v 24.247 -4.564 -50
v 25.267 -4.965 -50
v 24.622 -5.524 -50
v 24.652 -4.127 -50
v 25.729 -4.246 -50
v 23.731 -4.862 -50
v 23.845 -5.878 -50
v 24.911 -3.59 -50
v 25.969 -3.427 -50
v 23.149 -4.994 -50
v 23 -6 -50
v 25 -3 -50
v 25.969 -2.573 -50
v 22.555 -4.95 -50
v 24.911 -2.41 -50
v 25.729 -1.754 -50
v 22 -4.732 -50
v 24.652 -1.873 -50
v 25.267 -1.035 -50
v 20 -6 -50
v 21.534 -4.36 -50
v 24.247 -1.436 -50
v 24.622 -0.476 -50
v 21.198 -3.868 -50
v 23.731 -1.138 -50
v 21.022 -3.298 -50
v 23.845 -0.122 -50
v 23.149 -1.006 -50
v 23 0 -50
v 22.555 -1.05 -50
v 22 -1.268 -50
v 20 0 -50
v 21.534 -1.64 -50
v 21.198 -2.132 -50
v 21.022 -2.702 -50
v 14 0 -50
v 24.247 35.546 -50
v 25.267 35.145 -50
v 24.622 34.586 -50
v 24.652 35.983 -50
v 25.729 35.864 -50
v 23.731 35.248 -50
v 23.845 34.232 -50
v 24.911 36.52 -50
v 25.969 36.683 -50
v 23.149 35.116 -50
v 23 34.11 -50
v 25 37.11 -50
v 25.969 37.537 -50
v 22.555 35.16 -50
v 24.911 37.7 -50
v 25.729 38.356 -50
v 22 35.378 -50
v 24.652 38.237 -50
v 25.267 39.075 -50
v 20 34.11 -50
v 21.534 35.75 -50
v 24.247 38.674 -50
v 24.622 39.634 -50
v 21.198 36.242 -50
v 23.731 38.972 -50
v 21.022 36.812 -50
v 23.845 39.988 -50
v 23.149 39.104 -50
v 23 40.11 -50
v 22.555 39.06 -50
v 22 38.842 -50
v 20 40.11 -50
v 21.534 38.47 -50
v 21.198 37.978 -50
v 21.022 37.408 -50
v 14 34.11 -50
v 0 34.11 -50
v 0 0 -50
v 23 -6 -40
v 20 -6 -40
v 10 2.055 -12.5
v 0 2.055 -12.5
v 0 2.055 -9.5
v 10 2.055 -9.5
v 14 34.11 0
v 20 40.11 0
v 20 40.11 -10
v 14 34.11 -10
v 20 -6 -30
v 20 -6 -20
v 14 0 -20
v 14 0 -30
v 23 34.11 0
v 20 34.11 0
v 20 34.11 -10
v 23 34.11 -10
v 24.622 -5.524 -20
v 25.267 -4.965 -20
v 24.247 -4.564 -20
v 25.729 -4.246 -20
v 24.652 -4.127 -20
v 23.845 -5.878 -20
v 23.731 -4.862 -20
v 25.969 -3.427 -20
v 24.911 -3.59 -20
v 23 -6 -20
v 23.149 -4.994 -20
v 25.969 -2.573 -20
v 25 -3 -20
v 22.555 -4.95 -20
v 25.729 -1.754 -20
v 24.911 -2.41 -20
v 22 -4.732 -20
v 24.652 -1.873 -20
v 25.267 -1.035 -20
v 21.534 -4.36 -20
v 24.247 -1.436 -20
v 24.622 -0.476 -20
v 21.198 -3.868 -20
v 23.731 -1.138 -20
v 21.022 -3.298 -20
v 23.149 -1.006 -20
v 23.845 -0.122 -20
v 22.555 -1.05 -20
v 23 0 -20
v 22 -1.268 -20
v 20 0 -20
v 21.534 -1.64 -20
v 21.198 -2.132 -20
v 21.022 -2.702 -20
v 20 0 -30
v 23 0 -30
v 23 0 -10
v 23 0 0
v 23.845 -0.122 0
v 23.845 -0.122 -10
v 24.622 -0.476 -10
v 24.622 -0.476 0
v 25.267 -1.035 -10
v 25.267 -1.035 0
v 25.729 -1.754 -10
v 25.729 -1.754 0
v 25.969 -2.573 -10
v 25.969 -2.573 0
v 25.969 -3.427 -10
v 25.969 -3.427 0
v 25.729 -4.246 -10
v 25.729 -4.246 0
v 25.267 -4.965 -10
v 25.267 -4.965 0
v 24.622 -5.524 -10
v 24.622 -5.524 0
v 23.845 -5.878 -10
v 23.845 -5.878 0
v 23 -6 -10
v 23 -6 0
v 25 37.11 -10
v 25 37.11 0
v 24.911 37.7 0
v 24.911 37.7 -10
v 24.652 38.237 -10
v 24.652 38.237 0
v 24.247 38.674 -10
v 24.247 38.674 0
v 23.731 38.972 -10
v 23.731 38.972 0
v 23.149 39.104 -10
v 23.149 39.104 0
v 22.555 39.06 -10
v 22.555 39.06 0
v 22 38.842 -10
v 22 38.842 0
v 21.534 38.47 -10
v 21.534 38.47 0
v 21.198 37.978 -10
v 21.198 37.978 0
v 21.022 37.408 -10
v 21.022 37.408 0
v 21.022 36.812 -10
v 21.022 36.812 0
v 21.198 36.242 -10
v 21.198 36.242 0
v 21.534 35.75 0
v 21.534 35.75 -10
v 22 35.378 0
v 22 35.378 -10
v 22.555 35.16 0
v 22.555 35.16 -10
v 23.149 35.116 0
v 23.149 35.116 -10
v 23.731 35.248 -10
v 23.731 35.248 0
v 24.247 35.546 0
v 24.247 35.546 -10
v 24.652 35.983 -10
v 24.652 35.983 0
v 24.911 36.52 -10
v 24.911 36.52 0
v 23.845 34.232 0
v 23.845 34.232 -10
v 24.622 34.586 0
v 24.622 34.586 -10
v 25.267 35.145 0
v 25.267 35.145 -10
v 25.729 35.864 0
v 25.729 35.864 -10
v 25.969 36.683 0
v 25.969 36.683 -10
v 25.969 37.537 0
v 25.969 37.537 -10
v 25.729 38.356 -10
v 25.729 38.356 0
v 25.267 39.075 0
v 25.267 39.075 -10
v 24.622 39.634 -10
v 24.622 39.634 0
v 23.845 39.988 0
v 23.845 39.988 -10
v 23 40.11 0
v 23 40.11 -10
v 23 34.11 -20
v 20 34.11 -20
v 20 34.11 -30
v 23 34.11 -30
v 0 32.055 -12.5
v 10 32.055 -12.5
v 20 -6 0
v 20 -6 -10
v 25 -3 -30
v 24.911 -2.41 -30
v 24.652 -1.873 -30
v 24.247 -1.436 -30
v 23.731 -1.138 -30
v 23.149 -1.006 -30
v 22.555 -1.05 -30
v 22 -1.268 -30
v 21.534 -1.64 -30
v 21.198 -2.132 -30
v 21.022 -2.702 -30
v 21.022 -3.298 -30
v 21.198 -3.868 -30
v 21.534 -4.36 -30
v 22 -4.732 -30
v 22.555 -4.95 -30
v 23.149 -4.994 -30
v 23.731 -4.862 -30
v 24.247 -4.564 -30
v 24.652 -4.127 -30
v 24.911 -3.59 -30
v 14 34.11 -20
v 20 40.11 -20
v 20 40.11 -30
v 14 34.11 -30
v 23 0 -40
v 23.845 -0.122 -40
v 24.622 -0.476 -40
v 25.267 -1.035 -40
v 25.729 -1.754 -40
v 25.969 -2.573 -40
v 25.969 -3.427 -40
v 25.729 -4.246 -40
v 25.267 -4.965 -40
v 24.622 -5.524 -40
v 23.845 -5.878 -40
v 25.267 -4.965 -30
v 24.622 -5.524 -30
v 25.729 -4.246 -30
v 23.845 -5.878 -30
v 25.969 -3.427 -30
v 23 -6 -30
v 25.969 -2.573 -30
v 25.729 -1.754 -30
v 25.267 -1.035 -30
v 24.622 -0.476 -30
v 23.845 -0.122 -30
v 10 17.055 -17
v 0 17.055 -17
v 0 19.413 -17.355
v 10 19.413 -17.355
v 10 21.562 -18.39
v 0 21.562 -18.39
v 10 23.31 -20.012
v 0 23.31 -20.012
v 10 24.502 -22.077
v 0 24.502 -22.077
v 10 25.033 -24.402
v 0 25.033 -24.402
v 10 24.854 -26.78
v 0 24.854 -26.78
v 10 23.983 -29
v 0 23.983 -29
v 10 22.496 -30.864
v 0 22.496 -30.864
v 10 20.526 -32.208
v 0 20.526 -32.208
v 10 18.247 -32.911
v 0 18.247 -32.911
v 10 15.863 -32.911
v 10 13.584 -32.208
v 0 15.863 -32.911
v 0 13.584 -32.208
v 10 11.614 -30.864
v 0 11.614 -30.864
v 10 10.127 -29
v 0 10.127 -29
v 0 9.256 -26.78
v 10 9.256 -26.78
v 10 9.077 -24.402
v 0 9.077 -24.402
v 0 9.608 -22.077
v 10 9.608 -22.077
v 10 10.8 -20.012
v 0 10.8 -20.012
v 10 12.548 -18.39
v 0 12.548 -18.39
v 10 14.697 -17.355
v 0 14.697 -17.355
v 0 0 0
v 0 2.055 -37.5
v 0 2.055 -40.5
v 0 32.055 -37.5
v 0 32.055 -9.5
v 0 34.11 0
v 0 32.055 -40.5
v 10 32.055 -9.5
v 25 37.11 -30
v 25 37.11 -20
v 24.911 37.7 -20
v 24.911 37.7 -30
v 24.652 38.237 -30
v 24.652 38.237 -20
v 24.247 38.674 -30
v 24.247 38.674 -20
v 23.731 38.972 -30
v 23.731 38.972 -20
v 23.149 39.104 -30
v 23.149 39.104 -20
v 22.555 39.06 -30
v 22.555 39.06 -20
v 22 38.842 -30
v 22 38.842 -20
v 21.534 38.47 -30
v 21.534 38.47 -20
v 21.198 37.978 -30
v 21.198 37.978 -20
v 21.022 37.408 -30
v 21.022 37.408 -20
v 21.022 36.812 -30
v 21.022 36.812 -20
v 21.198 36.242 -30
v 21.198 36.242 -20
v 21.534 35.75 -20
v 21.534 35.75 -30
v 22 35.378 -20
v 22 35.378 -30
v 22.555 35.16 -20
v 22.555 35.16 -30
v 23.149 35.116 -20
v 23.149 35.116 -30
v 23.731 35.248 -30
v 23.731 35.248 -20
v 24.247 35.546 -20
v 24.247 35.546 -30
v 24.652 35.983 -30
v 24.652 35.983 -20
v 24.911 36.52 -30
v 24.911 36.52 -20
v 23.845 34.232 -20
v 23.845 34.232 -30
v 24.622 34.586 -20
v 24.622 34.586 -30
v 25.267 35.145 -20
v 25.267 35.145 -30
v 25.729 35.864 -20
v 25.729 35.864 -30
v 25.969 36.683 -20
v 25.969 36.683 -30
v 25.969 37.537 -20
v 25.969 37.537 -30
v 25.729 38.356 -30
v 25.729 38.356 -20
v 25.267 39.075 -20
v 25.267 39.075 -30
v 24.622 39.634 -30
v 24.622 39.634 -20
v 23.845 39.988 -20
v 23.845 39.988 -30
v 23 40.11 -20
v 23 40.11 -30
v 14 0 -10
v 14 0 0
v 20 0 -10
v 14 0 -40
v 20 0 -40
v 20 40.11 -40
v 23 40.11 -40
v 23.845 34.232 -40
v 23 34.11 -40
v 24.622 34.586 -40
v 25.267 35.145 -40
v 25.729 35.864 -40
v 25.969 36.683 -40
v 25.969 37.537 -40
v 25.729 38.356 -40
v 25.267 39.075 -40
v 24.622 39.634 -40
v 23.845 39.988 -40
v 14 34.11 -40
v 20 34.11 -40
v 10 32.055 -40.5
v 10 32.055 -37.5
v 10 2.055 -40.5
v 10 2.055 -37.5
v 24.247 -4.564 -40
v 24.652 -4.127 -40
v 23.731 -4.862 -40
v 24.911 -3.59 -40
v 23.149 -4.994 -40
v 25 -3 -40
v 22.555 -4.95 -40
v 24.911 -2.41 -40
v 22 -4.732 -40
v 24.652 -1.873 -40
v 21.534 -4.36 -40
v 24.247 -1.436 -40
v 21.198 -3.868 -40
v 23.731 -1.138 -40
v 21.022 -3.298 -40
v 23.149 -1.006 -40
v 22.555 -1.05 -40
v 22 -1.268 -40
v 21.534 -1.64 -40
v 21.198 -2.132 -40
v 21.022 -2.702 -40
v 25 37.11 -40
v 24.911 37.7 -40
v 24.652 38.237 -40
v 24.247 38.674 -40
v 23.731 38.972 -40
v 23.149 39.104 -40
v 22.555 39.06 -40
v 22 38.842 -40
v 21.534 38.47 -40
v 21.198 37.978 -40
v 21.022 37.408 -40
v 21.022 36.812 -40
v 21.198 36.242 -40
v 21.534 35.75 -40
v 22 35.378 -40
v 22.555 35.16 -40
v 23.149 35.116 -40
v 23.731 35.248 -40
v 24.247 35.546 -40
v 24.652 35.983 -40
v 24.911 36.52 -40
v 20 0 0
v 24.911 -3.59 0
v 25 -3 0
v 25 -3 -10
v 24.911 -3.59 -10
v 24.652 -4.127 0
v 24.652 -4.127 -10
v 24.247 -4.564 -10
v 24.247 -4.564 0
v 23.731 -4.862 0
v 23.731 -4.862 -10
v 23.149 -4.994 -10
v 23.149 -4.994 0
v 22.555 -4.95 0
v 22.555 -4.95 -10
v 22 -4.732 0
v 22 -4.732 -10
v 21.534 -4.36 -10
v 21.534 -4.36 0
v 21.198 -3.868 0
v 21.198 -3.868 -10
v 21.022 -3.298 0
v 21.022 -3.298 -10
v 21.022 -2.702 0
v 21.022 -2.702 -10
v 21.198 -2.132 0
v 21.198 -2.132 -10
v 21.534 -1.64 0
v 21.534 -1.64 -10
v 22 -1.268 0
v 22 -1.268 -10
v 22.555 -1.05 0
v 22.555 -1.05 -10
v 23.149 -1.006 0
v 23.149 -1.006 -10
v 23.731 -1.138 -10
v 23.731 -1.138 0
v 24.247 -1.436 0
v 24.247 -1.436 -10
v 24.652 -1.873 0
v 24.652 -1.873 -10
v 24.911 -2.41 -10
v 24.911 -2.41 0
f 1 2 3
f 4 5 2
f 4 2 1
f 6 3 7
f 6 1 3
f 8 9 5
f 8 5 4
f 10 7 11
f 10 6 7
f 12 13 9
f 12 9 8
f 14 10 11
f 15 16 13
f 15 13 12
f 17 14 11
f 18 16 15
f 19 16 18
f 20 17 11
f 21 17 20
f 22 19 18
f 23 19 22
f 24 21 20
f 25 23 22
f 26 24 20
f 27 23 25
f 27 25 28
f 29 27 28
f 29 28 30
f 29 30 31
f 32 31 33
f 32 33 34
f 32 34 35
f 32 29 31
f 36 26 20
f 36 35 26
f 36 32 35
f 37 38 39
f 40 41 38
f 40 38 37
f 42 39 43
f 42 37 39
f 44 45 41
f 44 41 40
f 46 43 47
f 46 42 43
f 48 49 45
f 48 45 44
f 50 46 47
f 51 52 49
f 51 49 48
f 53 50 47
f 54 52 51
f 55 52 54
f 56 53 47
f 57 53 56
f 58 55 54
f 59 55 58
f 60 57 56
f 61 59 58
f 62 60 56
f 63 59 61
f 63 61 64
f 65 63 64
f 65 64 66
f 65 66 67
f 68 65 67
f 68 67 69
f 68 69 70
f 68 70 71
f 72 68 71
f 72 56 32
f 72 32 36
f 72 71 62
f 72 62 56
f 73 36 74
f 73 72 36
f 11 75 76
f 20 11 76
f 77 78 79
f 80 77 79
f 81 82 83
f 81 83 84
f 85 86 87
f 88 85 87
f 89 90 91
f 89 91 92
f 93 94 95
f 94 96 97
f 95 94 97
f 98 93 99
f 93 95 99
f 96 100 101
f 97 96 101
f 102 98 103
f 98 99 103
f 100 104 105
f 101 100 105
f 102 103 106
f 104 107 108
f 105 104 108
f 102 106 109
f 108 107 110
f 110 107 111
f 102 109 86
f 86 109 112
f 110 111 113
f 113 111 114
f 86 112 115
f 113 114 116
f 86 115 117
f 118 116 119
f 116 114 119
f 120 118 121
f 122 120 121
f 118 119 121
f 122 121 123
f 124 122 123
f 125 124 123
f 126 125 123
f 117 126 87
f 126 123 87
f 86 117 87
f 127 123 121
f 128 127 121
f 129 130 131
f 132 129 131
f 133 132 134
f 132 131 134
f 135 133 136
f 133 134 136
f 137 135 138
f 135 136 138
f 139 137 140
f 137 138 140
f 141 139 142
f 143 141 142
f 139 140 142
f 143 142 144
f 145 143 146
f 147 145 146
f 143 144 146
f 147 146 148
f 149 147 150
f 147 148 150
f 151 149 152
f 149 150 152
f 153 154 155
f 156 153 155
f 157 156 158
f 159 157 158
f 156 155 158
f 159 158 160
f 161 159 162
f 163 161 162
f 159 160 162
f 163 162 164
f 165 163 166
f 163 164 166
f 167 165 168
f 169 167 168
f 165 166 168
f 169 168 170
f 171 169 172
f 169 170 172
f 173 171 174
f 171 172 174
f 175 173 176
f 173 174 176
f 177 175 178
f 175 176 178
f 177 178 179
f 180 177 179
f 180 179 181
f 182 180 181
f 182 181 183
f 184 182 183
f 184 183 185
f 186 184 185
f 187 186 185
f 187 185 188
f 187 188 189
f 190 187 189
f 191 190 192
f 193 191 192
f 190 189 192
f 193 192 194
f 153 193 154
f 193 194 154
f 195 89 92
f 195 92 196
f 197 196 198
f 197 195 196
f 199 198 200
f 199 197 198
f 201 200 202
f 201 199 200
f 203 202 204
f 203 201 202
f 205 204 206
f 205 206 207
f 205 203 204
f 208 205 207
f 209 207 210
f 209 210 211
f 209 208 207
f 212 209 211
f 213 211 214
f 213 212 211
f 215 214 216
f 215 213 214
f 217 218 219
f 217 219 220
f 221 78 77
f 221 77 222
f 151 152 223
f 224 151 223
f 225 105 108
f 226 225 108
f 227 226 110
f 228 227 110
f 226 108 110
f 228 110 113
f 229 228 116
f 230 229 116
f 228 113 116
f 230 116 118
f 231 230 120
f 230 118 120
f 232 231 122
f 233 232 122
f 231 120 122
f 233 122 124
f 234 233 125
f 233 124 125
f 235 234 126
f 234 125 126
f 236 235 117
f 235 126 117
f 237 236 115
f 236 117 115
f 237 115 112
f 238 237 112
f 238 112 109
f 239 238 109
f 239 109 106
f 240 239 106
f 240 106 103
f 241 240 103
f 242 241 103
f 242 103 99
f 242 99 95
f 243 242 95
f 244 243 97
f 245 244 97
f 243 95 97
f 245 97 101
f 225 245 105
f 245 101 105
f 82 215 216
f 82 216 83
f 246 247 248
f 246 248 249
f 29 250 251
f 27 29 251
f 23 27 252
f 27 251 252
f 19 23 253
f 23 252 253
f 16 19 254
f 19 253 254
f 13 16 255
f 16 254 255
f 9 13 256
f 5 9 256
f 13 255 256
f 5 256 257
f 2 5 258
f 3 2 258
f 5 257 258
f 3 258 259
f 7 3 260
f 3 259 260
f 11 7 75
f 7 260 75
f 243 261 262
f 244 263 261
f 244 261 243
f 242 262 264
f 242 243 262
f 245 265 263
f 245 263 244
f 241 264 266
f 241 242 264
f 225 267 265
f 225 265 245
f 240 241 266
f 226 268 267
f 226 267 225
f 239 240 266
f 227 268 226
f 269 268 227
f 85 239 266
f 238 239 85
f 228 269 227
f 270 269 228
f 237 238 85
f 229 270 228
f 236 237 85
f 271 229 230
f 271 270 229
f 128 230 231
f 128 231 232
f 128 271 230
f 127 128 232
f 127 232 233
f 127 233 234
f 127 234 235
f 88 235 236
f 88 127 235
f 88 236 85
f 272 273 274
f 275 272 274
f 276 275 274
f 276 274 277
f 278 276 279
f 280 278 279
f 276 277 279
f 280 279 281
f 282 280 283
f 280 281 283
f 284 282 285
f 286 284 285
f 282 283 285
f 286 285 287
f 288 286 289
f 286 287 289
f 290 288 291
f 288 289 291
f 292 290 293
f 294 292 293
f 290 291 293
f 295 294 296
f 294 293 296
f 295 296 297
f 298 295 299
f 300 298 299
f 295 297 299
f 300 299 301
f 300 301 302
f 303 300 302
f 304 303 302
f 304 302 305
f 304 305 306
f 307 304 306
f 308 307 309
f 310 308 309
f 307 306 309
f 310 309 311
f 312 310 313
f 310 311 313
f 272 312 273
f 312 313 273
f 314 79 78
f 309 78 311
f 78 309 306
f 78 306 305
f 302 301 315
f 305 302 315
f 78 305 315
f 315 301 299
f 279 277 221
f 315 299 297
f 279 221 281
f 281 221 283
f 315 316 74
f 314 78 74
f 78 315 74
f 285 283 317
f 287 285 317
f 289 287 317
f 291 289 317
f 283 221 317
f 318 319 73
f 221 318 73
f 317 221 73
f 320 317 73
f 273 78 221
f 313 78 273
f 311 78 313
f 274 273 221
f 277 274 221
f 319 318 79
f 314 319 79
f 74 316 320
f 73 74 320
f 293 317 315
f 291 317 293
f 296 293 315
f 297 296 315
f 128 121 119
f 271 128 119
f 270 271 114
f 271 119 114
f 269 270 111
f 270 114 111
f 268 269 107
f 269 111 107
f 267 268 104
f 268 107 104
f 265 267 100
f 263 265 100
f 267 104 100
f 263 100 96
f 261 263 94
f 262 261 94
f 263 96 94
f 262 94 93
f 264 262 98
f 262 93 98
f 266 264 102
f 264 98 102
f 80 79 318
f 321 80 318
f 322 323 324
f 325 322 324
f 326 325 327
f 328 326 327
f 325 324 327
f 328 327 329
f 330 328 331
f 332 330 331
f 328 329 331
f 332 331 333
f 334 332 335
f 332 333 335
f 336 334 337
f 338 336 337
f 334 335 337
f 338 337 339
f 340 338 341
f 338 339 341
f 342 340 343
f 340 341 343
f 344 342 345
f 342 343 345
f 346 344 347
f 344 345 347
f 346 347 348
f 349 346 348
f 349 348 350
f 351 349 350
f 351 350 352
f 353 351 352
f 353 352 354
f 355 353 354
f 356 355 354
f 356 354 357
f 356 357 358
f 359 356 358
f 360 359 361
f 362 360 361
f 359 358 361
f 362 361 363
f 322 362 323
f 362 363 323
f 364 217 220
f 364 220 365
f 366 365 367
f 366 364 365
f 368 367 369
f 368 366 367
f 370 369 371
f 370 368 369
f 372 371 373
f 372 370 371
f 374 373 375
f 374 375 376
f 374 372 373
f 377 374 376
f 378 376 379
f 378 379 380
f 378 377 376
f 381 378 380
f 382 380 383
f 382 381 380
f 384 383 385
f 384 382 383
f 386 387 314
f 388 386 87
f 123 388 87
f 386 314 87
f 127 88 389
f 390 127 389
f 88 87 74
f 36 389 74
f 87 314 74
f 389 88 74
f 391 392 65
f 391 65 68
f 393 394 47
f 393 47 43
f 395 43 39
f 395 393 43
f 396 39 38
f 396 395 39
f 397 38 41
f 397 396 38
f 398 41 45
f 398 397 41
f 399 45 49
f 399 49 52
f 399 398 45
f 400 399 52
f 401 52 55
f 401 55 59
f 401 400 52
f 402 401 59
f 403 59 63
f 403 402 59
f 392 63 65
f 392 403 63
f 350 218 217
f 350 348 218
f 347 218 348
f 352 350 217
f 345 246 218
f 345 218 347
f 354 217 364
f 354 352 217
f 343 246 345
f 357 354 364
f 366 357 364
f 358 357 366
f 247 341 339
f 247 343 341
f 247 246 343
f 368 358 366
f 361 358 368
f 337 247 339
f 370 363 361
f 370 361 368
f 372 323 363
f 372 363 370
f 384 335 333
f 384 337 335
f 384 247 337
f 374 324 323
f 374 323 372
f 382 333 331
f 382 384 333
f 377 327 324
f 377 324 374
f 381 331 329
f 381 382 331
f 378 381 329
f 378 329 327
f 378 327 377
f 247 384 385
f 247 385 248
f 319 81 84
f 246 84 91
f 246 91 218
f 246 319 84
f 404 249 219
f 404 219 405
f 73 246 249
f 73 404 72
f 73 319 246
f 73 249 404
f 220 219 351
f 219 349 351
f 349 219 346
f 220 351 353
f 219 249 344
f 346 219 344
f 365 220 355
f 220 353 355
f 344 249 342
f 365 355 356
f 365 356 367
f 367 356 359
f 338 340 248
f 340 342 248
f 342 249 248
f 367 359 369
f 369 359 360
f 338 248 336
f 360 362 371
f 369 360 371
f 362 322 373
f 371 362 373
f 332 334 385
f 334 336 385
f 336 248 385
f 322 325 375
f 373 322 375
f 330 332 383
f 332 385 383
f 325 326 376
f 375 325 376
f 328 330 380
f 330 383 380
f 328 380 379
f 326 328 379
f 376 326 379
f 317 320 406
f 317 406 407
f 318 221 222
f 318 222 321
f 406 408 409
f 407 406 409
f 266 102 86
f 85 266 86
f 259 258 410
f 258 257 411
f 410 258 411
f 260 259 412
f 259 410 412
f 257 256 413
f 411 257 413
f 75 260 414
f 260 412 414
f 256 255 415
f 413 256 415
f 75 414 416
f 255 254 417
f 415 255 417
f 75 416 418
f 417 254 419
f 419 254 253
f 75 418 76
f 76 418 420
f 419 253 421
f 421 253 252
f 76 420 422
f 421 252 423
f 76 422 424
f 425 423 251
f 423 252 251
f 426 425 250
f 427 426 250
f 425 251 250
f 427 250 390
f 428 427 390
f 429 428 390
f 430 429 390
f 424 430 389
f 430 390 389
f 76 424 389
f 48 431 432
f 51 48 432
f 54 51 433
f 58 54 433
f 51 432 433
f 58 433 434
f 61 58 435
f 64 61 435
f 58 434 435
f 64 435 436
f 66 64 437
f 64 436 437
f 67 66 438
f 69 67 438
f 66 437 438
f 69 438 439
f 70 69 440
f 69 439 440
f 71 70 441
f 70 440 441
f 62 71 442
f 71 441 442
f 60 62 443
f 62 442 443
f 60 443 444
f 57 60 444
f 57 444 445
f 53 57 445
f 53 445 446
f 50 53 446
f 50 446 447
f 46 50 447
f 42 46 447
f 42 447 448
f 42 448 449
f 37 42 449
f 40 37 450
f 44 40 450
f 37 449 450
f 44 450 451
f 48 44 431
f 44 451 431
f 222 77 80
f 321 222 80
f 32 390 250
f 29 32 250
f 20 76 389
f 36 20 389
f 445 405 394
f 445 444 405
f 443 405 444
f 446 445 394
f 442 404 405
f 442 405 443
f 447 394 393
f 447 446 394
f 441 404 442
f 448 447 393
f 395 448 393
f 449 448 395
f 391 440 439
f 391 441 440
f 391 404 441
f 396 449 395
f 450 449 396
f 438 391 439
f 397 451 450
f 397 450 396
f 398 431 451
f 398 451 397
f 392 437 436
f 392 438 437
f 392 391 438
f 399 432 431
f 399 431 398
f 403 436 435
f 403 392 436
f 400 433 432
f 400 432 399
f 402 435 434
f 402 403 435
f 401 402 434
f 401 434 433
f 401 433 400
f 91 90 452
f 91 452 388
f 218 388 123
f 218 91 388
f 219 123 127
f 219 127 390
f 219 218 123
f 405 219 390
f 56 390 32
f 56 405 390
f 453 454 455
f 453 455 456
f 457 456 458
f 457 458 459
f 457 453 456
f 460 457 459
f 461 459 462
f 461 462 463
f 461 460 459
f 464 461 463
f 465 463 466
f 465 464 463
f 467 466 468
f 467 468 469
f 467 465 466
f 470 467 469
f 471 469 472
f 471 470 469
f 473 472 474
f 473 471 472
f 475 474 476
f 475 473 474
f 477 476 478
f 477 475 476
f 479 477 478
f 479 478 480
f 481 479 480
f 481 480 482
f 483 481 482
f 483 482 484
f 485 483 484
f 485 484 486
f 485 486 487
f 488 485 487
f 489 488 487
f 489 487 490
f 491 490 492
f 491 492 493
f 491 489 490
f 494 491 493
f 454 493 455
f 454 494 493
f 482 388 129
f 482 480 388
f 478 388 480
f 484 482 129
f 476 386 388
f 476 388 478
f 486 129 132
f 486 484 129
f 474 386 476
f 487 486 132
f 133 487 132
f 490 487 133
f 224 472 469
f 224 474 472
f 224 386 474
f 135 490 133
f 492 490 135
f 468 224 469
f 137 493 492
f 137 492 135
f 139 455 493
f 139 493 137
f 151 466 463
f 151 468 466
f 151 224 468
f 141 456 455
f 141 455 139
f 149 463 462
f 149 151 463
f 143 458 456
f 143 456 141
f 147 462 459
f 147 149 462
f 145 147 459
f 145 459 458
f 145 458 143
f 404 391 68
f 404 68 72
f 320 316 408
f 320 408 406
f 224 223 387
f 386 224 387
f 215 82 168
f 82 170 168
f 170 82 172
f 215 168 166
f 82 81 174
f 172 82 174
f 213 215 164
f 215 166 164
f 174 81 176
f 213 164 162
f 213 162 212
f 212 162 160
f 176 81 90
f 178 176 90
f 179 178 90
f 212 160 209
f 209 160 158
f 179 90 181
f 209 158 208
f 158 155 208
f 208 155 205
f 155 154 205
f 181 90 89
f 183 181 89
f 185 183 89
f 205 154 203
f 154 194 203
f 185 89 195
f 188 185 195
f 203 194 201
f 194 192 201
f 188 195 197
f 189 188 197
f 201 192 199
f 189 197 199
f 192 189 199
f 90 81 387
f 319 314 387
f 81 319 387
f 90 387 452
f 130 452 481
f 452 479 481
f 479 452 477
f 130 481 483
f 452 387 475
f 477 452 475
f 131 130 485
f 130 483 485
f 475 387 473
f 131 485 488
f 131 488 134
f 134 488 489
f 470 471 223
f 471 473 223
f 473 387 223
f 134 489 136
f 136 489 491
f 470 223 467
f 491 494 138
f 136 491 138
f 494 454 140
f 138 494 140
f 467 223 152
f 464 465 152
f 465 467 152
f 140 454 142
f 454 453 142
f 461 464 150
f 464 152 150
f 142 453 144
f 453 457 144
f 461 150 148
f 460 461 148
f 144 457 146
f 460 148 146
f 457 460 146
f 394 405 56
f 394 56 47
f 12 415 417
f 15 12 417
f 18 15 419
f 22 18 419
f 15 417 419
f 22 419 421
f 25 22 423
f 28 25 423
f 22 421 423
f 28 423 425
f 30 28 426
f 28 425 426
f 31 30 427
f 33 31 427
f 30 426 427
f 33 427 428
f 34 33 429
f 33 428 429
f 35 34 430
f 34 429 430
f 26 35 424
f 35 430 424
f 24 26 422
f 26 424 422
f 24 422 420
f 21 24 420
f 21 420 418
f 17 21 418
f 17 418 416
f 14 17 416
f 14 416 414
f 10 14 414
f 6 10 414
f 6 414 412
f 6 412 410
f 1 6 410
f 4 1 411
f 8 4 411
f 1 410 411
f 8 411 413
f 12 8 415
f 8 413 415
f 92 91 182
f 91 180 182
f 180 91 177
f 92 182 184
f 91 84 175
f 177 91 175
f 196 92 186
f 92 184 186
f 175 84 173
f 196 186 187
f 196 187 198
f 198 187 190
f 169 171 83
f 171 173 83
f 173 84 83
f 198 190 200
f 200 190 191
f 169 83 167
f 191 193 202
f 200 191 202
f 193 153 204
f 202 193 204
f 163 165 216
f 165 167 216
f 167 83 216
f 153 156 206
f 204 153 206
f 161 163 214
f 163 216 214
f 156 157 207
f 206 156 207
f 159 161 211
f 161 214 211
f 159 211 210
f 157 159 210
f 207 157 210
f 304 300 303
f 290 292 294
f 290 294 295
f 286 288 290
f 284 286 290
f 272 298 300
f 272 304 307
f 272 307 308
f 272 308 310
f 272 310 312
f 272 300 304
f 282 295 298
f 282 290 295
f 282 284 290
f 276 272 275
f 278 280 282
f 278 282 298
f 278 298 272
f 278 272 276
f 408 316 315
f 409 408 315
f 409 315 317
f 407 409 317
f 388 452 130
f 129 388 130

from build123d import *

# Parameters (mm, degrees)
SKETCH1_W               = 50
SKETCH1_H               = 34.11
BOSS_EXTRUDE1_DEPTH     = 20
SKETCH2_R               = 2
BOSS_EXTRUDE2_DEPTH     = 10
LPATTERN1_COUNT         = 3
LPATTERN1_PITCH         = 20
MIRROR1_COPY_1_SKETCH_R = 2
MIRROR1_COPY_1_DEPTH    = 10
MIRROR1_COPY_2_SKETCH_R = 2
MIRROR1_COPY_2_DEPTH    = 10
SKETCH3_R               = 8
SKETCH3_W               = 3
SKETCH3_H               = 30
CUT_EXTRUDE1_DEPTH      = 10


with BuildPart() as part:
    # Sketch1 → Boss-Extrude1 (new body)
    with BuildSketch(Plane(origin=(0, 0, 0), x_dir=(0, 0, -1), z_dir=(1, 0, 0))):
        with Locations((25, 17.055)):
            Rectangle(SKETCH1_W, SKETCH1_H)
    extrude(amount=BOSS_EXTRUDE1_DEPTH)

    # Sketch2 → Boss-Extrude2 (add)
    with BuildSketch(Plane.XY):
        with BuildLine():
            Line((20, 34.11), (23, 34.11))
            ThreePointArc((23, 34.11), (26, 37.11), (23, 40.11))
            Line((23, 40.11), (20, 40.11))
            Line((20, 40.11), (14, 34.11))
            Line((14, 34.11), (20, 34.11))
        make_face()
        with Locations((23, 37.11)):
            Circle(SKETCH2_R, mode=Mode.SUBTRACT)
    boss_extrude2 = extrude(amount=-BOSS_EXTRUDE2_DEPTH)

    # LPattern1: Boss-Extrude2 ×3
    with Locations(*[(0, 0, -i * LPATTERN1_PITCH) for i in range(1, LPATTERN1_COUNT)]):
        add(boss_extrude2)

    # Mirror1: Boss-Extrude2 across plane
    add(boss_extrude2.mirror(Plane.ZX.offset(17.055)))

    # Mirror1 copy 1 sketch → Mirror1 copy 1 (add)
    with BuildSketch(Plane(origin=(0, 34.11, -20), x_dir=(1, 0, 0), z_dir=(0, 0, 1))):
        with BuildLine():
            Line((20, -34.11), (23, -34.11))
            ThreePointArc((23, -34.11), (26, -37.11), (23, -40.11))
            Line((23, -40.11), (20, -40.11))
            Line((20, -40.11), (14, -34.11))
            Line((14, -34.11), (20, -34.11))
        make_face()
        with Locations((23, -37.11)):
            Circle(MIRROR1_COPY_1_SKETCH_R, mode=Mode.SUBTRACT)
    extrude(amount=-MIRROR1_COPY_1_DEPTH)

    # Mirror1 copy 2 sketch → Mirror1 copy 2 (add)
    with BuildSketch(Plane(origin=(0, 34.11, -40), x_dir=(1, 0, 0), z_dir=(0, 0, 1))):
        with BuildLine():
            Line((20, -34.11), (23, -34.11))
            ThreePointArc((23, -34.11), (26, -37.11), (23, -40.11))
            Line((23, -40.11), (20, -40.11))
            Line((20, -40.11), (14, -34.11))
            Line((14, -34.11), (20, -34.11))
        make_face()
        with Locations((23, -37.11)):
            Circle(MIRROR1_COPY_2_SKETCH_R, mode=Mode.SUBTRACT)
    extrude(amount=-MIRROR1_COPY_2_DEPTH)

    # Sketch3 → Cut-Extrude1 (cut)
    with BuildSketch(Plane.ZY):
        with Locations((-25, 17.055)):
            Circle(SKETCH3_R)
        with Locations((-39, 17.055)):
            Rectangle(SKETCH3_W, SKETCH3_H)
        with Locations((-11, 17.055)):
            Rectangle(SKETCH3_W, SKETCH3_H)
    extrude(amount=-CUT_EXTRUDE1_DEPTH, mode=Mode.SUBTRACT)


solid = part.part
